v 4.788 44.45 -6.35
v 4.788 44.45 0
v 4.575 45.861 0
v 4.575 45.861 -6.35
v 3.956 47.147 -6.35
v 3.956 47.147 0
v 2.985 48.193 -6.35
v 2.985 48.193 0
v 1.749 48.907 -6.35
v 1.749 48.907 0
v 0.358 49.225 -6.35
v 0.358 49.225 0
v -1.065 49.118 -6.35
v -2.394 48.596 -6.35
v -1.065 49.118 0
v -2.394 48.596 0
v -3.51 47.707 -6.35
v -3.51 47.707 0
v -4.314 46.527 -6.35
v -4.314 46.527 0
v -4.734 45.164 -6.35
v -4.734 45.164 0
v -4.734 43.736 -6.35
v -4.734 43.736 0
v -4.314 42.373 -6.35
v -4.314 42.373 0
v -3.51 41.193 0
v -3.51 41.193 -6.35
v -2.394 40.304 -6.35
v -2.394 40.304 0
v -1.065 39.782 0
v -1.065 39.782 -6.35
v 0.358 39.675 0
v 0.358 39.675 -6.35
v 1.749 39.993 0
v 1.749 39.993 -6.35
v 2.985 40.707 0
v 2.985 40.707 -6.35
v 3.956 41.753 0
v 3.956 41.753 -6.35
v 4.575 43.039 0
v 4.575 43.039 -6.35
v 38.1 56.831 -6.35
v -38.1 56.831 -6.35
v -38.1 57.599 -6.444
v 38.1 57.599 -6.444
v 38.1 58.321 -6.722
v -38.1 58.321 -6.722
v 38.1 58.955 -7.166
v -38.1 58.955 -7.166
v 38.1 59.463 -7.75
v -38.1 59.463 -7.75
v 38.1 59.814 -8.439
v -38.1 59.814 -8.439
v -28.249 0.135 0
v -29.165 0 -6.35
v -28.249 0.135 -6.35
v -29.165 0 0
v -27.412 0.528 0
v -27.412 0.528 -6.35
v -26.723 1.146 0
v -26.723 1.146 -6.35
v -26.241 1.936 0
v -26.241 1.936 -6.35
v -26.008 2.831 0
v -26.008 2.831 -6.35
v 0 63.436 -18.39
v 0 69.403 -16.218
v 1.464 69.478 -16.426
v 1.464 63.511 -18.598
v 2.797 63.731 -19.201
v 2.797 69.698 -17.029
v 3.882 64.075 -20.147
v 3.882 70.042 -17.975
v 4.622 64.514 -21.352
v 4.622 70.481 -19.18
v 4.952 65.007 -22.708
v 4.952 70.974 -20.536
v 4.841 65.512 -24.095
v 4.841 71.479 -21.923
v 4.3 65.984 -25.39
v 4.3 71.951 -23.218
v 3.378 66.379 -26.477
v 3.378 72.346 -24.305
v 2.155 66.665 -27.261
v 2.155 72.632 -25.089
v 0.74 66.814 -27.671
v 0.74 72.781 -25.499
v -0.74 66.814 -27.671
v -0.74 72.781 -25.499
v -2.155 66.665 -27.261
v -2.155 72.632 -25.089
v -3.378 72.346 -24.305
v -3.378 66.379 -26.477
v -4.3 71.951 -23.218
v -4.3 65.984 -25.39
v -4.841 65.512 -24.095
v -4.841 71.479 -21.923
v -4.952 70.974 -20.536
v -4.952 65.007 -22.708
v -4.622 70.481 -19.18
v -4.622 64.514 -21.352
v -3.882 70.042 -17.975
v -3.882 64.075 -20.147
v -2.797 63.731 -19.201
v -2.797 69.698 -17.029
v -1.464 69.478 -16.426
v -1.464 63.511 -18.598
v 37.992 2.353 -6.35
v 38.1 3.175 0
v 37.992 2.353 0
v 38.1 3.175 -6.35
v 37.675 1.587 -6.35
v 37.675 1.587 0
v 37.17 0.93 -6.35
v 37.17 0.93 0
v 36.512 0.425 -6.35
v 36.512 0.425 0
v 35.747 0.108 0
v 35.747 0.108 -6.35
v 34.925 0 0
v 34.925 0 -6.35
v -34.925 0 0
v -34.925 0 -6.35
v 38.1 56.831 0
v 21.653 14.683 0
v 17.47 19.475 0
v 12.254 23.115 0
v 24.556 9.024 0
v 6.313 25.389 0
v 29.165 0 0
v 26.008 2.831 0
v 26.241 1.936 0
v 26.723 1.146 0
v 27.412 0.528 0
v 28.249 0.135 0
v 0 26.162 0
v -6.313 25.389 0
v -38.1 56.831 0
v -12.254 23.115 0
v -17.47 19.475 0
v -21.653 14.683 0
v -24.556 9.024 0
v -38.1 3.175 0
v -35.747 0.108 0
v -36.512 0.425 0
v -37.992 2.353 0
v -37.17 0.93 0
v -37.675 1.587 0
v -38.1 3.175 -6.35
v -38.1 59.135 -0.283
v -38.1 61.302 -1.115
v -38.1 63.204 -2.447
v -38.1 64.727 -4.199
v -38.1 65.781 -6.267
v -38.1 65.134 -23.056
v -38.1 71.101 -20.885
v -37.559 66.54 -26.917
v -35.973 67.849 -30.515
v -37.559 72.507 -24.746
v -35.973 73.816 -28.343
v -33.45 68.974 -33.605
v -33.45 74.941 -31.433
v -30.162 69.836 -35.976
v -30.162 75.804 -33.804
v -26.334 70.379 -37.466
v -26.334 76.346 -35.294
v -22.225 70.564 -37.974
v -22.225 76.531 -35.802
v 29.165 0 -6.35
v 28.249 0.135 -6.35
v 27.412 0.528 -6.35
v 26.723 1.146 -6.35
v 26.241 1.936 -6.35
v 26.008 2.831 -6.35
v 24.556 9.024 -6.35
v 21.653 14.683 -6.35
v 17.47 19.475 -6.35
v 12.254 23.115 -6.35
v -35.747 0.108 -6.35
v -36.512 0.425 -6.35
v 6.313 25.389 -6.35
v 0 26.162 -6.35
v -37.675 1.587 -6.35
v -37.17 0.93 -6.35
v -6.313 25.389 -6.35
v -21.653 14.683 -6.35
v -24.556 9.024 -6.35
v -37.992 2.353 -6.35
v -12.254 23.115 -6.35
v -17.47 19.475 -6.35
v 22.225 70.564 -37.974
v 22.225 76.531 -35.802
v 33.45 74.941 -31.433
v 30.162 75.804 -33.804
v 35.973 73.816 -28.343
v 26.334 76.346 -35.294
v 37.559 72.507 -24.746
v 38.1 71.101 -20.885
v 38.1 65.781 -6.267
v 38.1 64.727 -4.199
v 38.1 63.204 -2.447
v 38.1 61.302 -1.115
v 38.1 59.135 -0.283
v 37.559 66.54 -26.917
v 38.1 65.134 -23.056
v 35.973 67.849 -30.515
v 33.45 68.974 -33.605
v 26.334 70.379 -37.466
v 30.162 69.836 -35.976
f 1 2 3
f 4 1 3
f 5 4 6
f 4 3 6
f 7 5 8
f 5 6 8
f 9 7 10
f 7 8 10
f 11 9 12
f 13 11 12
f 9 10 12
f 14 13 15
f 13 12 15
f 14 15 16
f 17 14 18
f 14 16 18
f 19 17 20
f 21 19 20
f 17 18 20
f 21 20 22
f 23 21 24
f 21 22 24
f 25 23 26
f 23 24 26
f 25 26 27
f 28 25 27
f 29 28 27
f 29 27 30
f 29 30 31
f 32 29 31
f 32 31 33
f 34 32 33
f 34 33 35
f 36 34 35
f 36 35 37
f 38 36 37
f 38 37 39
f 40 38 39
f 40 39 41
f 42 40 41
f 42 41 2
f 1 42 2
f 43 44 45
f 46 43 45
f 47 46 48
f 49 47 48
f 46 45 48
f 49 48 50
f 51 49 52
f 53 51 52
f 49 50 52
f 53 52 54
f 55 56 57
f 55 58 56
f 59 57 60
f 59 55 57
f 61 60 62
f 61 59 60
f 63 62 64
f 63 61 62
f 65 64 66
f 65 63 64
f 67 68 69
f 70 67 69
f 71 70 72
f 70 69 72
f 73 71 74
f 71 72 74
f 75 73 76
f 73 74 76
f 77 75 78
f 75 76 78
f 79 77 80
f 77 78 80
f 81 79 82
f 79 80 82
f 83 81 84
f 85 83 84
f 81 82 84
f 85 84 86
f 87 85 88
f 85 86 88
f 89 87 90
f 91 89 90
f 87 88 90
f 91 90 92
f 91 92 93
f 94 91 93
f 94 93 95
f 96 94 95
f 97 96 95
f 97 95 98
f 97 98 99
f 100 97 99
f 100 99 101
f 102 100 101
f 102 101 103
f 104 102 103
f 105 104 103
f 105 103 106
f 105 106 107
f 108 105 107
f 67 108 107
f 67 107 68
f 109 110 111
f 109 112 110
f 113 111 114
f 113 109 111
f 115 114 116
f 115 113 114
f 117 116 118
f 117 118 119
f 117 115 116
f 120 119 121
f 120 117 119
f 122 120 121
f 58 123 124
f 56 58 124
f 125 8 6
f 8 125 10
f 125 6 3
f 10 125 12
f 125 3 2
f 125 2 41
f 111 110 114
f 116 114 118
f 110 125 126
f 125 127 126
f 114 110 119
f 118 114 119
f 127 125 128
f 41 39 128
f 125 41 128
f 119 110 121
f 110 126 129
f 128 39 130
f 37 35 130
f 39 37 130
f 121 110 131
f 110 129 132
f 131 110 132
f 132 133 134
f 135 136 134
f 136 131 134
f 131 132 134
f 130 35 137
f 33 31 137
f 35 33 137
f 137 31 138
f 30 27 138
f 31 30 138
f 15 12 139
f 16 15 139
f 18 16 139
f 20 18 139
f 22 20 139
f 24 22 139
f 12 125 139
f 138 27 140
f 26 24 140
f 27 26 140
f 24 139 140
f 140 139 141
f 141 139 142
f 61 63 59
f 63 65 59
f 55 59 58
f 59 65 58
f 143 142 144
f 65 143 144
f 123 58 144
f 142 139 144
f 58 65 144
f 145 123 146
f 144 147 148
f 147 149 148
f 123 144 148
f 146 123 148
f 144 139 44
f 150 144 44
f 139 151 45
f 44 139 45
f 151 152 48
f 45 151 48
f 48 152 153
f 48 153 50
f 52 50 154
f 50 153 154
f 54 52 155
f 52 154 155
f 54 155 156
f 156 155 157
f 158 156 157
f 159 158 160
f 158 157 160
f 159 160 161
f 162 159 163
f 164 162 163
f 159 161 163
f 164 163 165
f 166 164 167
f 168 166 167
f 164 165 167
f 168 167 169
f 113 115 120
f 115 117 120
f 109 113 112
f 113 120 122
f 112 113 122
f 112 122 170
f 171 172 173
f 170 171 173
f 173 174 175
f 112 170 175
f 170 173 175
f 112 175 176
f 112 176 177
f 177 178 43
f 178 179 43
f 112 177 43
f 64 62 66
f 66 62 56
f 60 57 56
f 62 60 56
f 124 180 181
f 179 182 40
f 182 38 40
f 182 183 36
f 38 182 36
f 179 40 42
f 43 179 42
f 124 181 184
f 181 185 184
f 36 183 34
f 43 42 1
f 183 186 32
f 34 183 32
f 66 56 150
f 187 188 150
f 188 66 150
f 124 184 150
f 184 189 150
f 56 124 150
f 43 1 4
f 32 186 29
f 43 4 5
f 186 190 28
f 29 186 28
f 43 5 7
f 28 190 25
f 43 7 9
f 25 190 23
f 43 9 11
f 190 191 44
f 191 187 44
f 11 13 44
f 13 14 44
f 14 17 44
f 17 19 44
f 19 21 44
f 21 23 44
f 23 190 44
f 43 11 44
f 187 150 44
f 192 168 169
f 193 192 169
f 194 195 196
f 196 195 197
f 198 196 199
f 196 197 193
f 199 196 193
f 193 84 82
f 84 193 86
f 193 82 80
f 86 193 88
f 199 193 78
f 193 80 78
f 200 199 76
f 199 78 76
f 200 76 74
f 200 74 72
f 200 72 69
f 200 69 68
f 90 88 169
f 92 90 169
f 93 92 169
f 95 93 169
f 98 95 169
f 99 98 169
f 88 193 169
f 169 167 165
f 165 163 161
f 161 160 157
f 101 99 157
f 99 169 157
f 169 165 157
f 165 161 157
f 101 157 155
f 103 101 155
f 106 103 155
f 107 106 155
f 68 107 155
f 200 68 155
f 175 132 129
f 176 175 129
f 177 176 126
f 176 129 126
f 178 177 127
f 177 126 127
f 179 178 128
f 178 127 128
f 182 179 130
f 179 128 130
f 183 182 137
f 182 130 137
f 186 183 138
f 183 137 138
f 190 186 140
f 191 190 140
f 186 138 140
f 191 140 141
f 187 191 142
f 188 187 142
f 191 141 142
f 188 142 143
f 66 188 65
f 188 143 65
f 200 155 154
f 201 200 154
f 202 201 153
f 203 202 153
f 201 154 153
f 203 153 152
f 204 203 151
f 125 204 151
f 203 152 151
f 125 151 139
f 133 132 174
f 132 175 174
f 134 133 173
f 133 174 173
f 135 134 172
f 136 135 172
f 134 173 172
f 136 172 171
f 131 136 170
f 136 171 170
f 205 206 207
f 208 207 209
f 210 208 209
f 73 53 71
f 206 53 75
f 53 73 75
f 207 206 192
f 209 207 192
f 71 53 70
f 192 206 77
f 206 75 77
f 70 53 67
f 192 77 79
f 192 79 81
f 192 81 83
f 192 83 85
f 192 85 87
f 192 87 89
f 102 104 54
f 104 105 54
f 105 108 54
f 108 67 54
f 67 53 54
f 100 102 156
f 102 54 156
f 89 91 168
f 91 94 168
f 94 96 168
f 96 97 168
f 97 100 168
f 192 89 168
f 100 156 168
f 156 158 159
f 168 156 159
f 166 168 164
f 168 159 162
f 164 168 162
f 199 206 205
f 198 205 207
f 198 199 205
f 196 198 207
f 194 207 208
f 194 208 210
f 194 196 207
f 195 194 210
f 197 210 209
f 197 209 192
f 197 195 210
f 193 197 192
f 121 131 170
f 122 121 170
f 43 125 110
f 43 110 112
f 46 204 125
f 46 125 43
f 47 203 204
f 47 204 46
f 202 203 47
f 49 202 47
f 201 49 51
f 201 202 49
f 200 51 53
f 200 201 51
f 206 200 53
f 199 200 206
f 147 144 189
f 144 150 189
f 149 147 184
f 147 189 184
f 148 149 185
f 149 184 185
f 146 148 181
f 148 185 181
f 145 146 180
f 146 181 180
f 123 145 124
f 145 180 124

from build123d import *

# Parameters (mm, degrees)
BASE_FLANGE1_START = -38.1
BASE_FLANGE1_DEPTH = 76.2
SKETCH6_R          = 26.162
SKETCH6_R_2        = 4.7879
CUT_EXTRUDE1_DEPTH = 94.544815593
SKETCH7_R          = 4.9657
CUT_EXTRUDE2_DEPTH = 90.4661943
FILLET1_R          = 15.875
FILLET2_R          = 3.175


# Read off the part's stored shape, not the designer's step: Base-Flange1
with BuildPart() as part:
    # Base-Flange1 outline → Base-Flange1 (new body)
    with BuildSketch(Plane(origin=(0, 0, 0), x_dir=(0, 0, -1), z_dir=(1, 0, 0)).offset(BASE_FLANGE1_START)):
        with BuildLine():
            Line((0, 56.830523199), (0, 0))
            Line((0, 0), (6.35, 0))
            Line((6.35, 0), (6.35, 56.830523199))
            ThreePointArc((6.35, 56.830523199), (6.924192259, 58.651628384), (8.439086045, 59.81404727))
            Line((8.439086045, 59.81404727), (37.974116762, 70.563919319))
            Line((37.974116762, 70.563919319), (35.802288852, 76.530967461))
            Line((35.802288852, 76.530967461), (6.267258135, 65.781095412))
            ThreePointArc((6.267258135, 65.781095412), (1.722576778, 62.293838755), (0, 56.830523199))
        make_face()
    extrude(amount=BASE_FLANGE1_DEPTH)

    # Sketch6 → Cut-Extrude1 (cut, through all)
    with BuildSketch(Plane.XY):
        Circle(SKETCH6_R)
        with Locations((0, 44.45)):
            Circle(SKETCH6_R_2)
    extrude(amount=-CUT_EXTRUDE1_DEPTH, mode=Mode.SUBTRACT)

    # Sketch7 → Cut-Extrude2 (cut, through all)
    with BuildSketch(Plane(origin=(0, 56.071911069, 20.408506608), x_dir=(1, 0, 0), z_dir=(0, 0.9396926207859093, 0.34202014332566627))):
        with Locations(Location((0, 43.943279101, 0), (0, 0, 270))):
            Circle(SKETCH7_R)
    extrude(amount=-CUT_EXTRUDE2_DEPTH, mode=Mode.SUBTRACT)

    # Fillet1
    fillet1_edges = [part.edges().sort_by_distance(p)[0] for p in [
        (38.1, 73.54744339, -36.888202807),
        (-38.1, 73.54744339, -36.888202807),
    ]]
    fillet(fillet1_edges, radius=FILLET1_R)

    # Fillet2
    fillet2_edges = [part.edges().sort_by_distance(p)[0] for p in [
        (26.162, 0, -3.175),
        (-26.162, 0, -3.175),
        (38.1, 0, -3.175),
        (-38.1, 0, -3.175),
    ]]
    fillet(fillet2_edges, radius=FILLET2_R)


solid = part.part
